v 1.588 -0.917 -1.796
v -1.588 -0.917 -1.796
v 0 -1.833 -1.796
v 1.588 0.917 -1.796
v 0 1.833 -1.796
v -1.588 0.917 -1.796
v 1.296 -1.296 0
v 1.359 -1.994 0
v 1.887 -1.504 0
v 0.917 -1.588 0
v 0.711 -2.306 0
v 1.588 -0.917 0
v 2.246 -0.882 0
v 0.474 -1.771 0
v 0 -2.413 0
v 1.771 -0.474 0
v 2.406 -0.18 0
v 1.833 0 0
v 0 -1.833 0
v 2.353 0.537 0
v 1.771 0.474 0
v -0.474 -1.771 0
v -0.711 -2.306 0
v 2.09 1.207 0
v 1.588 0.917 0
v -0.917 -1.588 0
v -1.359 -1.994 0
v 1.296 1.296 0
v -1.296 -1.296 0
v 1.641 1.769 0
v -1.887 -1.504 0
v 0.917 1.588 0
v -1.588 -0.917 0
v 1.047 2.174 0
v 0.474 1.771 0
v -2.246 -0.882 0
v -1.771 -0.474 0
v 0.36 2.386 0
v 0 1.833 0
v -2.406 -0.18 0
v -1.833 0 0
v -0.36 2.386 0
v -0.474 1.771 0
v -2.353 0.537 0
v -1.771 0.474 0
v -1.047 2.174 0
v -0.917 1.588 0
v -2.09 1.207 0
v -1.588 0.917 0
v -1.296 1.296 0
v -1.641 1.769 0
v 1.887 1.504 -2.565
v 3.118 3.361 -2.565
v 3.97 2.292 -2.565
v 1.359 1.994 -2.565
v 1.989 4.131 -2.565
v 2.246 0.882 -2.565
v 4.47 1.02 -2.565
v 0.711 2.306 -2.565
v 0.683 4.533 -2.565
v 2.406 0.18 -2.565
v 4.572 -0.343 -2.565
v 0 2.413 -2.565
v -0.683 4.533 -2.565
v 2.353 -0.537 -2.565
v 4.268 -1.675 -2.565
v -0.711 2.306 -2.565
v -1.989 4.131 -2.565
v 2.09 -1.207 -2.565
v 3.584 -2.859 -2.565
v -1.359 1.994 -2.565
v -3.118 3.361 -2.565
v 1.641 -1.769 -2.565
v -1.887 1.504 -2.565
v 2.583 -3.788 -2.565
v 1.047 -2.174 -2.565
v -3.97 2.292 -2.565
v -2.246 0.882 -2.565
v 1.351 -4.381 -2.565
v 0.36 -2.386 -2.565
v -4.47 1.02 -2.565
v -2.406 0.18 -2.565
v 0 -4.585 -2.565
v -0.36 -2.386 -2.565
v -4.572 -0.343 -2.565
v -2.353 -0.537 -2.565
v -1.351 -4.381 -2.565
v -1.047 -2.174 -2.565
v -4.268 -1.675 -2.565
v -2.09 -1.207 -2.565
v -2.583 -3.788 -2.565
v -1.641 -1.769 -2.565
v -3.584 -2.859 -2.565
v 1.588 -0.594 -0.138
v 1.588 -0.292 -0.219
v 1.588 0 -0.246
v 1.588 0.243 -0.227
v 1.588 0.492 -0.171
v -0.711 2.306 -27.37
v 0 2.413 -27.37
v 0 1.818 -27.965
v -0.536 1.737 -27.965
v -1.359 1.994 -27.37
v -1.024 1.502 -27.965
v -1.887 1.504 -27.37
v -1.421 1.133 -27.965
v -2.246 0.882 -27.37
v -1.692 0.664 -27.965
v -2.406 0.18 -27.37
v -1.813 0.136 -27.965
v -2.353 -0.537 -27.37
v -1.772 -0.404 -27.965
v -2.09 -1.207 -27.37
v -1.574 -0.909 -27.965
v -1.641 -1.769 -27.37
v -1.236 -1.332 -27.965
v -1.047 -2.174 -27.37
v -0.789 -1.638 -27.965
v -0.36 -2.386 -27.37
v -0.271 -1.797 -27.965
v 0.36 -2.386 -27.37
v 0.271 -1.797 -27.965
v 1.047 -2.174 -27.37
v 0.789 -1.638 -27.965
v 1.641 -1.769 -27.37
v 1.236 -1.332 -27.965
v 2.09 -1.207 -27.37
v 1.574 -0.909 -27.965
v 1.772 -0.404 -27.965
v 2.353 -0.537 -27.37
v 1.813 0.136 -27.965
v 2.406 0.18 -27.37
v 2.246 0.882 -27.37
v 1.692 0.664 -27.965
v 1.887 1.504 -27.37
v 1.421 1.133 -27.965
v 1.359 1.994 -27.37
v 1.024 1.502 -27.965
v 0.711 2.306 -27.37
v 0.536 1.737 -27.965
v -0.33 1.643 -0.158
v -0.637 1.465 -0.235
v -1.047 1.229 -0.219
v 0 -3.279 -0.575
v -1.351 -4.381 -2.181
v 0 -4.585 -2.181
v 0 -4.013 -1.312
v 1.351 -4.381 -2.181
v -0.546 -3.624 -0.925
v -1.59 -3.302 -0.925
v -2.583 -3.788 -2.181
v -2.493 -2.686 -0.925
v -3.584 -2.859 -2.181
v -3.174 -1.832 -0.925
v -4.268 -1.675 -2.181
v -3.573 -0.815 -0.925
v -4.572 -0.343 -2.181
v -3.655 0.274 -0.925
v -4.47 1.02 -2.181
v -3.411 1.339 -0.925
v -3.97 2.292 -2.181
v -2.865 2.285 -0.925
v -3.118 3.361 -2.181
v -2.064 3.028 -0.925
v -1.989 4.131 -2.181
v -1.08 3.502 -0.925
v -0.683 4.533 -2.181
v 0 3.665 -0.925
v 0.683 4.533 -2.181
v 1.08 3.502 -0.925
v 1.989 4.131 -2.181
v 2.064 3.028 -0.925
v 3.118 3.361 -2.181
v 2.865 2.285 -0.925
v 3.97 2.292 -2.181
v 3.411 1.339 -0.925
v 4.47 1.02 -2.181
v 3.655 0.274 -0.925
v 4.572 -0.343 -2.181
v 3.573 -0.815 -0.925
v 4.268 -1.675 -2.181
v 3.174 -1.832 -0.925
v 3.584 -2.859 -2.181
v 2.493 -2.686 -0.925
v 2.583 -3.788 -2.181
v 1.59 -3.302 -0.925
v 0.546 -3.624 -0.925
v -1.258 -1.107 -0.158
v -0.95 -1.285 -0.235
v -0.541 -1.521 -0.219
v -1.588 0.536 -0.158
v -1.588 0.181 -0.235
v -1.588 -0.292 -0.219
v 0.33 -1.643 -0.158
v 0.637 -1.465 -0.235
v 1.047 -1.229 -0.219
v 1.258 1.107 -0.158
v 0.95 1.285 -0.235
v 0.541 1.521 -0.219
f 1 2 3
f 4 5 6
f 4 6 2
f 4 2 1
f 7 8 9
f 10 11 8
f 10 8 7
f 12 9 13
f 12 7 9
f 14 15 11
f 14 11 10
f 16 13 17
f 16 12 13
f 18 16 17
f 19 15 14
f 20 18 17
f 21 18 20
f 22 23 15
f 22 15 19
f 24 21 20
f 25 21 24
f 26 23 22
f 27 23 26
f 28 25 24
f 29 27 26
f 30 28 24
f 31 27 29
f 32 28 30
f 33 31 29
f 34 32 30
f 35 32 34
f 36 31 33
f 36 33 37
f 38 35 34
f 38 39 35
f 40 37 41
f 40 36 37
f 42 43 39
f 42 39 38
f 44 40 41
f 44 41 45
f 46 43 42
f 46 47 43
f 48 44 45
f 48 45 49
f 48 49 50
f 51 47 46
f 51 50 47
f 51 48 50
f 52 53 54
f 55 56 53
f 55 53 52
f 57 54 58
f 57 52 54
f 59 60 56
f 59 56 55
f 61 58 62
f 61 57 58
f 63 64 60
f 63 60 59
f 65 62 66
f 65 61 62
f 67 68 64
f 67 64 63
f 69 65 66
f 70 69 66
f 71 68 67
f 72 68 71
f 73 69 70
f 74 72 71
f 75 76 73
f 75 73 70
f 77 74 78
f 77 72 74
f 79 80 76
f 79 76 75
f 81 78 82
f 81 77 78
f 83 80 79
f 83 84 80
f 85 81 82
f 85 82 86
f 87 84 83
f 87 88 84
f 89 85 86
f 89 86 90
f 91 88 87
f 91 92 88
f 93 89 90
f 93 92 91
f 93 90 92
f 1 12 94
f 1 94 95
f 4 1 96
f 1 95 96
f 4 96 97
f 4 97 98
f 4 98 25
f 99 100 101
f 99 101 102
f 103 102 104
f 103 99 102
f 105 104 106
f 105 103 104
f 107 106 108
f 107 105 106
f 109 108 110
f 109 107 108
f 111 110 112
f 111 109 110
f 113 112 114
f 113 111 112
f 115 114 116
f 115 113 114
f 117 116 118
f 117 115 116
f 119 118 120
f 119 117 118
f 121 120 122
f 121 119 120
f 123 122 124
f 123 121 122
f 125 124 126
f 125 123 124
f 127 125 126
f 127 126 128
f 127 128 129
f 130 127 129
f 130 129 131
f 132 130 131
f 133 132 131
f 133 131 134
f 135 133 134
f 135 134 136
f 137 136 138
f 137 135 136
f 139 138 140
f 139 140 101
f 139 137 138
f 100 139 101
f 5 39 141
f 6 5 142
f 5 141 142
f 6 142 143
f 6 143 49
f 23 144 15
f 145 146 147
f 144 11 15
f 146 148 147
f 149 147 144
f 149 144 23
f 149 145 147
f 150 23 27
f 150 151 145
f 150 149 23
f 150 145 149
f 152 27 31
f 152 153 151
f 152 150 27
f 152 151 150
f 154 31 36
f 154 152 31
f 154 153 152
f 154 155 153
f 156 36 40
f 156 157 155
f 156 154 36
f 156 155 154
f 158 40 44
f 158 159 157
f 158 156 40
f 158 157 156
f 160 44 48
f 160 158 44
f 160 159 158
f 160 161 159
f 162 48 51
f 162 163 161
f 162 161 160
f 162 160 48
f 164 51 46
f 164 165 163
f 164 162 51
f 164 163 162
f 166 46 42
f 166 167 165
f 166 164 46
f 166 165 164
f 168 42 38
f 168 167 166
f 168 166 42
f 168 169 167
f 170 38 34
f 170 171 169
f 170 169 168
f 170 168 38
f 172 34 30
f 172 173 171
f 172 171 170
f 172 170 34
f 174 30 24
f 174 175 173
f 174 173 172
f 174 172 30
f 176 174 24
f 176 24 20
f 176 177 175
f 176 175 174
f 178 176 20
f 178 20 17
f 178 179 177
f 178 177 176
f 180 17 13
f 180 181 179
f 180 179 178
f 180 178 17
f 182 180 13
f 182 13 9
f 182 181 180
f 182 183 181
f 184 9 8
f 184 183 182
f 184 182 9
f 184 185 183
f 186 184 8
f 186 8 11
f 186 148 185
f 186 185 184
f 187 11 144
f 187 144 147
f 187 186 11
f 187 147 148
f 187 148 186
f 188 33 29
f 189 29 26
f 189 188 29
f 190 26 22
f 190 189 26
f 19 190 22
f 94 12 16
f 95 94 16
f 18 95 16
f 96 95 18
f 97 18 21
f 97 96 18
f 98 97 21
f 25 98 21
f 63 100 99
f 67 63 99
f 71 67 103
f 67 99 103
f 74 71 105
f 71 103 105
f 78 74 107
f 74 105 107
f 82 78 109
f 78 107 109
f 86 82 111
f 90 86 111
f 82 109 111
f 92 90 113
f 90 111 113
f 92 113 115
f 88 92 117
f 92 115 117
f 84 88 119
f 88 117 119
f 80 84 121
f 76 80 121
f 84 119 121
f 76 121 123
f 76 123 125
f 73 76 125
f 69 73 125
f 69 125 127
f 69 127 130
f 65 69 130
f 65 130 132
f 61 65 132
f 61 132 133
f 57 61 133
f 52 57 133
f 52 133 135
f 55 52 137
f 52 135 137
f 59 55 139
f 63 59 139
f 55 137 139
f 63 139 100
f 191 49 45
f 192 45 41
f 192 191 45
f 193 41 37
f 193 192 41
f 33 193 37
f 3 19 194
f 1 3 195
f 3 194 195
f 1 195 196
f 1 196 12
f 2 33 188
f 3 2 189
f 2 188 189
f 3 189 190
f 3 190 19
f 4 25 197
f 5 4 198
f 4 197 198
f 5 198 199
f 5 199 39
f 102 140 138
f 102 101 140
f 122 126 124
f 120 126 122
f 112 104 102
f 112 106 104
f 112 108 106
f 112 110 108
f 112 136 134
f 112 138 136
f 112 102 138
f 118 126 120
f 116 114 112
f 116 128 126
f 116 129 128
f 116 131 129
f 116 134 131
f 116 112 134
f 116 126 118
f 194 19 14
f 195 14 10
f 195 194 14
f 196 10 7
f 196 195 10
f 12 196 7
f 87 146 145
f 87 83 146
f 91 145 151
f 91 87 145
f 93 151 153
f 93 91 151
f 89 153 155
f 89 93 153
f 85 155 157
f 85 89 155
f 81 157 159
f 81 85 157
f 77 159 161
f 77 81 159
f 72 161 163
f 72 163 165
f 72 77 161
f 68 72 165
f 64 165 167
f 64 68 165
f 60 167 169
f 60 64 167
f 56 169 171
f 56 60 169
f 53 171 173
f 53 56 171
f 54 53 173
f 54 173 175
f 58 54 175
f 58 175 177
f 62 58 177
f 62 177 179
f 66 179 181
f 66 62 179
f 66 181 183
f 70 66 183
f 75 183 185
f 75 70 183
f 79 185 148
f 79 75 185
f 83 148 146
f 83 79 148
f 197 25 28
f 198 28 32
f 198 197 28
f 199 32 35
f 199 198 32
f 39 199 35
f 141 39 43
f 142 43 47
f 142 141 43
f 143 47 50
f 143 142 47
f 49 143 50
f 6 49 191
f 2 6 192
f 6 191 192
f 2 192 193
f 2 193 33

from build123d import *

# Parameters (mm, degrees)
SKETCH1_W          = 25.4
SKETCH1_H          = 2.413
CHAMFER1_SIZE      = 0.5953125
CUT_EXTRUDE2_DEPTH = 1.79578
SKETCH6_R          = 1.833087105
CUT_EXTRUDE3_DEPTH = 1.79578
CUT_EXTRUDE3_TAPER = 45


with BuildPart() as part:
    # Sketch1 → Revolve1 (revolve)
    with BuildSketch(Plane(origin=(0, 0, 0), x_dir=(0, 0, -1), z_dir=(1, 0, 0))):
        with Locations((15.2654, 1.2065)):
            Rectangle(SKETCH1_W, SKETCH1_H)
    revolve(axis=Axis((0, 0, -27.9654), (0, 0, 1)))

    # Chamfer1
    chamfer1_edges = [part.edges().sort_by_distance(p)[0] for p in [
        (0, -2.413, -27.9654),
    ]]
    chamfer(chamfer1_edges, length=CHAMFER1_SIZE)

    # Sketch7 → Revolve2 (revolve)
    with BuildSketch(Plane(origin=(0, 0, 0), x_dir=(0, 0, -1), z_dir=(1, 0, 0))):
        with BuildLine():
            Line((2.18059, 4.5847), (2.5654, 4.5847))
            Line((2.5654, 4.5847), (2.5654, 0))
            Line((2.5654, 0), (0, 0))
            Line((0, 0), (0, 2.413))
            ThreePointArc((0, 2.413), (0.925030326, 3.664791196), (2.18059, 4.5847))
        make_face()
    revolve(axis=Axis((0, 0, 0), (0, 0, -1)))

    # Sketch5 → Cut-Extrude2 (cut)
    with BuildSketch(Plane.XY):
        Polygon((1.5875, -0.916543552), (1.5875, 0.916543552), (0, 1.833087105), (-1.5875, 0.916543552), (-1.5875, -0.916543552), (0, -1.833087105), align=None)
    extrude(amount=-CUT_EXTRUDE2_DEPTH, mode=Mode.SUBTRACT)

    # Sketch6 → Cut-Extrude3 (cut)
    with BuildSketch(Plane.XY):
        Circle(SKETCH6_R)
    extrude(amount=-CUT_EXTRUDE3_DEPTH, taper=CUT_EXTRUDE3_TAPER, mode=Mode.SUBTRACT)


solid = part.part
